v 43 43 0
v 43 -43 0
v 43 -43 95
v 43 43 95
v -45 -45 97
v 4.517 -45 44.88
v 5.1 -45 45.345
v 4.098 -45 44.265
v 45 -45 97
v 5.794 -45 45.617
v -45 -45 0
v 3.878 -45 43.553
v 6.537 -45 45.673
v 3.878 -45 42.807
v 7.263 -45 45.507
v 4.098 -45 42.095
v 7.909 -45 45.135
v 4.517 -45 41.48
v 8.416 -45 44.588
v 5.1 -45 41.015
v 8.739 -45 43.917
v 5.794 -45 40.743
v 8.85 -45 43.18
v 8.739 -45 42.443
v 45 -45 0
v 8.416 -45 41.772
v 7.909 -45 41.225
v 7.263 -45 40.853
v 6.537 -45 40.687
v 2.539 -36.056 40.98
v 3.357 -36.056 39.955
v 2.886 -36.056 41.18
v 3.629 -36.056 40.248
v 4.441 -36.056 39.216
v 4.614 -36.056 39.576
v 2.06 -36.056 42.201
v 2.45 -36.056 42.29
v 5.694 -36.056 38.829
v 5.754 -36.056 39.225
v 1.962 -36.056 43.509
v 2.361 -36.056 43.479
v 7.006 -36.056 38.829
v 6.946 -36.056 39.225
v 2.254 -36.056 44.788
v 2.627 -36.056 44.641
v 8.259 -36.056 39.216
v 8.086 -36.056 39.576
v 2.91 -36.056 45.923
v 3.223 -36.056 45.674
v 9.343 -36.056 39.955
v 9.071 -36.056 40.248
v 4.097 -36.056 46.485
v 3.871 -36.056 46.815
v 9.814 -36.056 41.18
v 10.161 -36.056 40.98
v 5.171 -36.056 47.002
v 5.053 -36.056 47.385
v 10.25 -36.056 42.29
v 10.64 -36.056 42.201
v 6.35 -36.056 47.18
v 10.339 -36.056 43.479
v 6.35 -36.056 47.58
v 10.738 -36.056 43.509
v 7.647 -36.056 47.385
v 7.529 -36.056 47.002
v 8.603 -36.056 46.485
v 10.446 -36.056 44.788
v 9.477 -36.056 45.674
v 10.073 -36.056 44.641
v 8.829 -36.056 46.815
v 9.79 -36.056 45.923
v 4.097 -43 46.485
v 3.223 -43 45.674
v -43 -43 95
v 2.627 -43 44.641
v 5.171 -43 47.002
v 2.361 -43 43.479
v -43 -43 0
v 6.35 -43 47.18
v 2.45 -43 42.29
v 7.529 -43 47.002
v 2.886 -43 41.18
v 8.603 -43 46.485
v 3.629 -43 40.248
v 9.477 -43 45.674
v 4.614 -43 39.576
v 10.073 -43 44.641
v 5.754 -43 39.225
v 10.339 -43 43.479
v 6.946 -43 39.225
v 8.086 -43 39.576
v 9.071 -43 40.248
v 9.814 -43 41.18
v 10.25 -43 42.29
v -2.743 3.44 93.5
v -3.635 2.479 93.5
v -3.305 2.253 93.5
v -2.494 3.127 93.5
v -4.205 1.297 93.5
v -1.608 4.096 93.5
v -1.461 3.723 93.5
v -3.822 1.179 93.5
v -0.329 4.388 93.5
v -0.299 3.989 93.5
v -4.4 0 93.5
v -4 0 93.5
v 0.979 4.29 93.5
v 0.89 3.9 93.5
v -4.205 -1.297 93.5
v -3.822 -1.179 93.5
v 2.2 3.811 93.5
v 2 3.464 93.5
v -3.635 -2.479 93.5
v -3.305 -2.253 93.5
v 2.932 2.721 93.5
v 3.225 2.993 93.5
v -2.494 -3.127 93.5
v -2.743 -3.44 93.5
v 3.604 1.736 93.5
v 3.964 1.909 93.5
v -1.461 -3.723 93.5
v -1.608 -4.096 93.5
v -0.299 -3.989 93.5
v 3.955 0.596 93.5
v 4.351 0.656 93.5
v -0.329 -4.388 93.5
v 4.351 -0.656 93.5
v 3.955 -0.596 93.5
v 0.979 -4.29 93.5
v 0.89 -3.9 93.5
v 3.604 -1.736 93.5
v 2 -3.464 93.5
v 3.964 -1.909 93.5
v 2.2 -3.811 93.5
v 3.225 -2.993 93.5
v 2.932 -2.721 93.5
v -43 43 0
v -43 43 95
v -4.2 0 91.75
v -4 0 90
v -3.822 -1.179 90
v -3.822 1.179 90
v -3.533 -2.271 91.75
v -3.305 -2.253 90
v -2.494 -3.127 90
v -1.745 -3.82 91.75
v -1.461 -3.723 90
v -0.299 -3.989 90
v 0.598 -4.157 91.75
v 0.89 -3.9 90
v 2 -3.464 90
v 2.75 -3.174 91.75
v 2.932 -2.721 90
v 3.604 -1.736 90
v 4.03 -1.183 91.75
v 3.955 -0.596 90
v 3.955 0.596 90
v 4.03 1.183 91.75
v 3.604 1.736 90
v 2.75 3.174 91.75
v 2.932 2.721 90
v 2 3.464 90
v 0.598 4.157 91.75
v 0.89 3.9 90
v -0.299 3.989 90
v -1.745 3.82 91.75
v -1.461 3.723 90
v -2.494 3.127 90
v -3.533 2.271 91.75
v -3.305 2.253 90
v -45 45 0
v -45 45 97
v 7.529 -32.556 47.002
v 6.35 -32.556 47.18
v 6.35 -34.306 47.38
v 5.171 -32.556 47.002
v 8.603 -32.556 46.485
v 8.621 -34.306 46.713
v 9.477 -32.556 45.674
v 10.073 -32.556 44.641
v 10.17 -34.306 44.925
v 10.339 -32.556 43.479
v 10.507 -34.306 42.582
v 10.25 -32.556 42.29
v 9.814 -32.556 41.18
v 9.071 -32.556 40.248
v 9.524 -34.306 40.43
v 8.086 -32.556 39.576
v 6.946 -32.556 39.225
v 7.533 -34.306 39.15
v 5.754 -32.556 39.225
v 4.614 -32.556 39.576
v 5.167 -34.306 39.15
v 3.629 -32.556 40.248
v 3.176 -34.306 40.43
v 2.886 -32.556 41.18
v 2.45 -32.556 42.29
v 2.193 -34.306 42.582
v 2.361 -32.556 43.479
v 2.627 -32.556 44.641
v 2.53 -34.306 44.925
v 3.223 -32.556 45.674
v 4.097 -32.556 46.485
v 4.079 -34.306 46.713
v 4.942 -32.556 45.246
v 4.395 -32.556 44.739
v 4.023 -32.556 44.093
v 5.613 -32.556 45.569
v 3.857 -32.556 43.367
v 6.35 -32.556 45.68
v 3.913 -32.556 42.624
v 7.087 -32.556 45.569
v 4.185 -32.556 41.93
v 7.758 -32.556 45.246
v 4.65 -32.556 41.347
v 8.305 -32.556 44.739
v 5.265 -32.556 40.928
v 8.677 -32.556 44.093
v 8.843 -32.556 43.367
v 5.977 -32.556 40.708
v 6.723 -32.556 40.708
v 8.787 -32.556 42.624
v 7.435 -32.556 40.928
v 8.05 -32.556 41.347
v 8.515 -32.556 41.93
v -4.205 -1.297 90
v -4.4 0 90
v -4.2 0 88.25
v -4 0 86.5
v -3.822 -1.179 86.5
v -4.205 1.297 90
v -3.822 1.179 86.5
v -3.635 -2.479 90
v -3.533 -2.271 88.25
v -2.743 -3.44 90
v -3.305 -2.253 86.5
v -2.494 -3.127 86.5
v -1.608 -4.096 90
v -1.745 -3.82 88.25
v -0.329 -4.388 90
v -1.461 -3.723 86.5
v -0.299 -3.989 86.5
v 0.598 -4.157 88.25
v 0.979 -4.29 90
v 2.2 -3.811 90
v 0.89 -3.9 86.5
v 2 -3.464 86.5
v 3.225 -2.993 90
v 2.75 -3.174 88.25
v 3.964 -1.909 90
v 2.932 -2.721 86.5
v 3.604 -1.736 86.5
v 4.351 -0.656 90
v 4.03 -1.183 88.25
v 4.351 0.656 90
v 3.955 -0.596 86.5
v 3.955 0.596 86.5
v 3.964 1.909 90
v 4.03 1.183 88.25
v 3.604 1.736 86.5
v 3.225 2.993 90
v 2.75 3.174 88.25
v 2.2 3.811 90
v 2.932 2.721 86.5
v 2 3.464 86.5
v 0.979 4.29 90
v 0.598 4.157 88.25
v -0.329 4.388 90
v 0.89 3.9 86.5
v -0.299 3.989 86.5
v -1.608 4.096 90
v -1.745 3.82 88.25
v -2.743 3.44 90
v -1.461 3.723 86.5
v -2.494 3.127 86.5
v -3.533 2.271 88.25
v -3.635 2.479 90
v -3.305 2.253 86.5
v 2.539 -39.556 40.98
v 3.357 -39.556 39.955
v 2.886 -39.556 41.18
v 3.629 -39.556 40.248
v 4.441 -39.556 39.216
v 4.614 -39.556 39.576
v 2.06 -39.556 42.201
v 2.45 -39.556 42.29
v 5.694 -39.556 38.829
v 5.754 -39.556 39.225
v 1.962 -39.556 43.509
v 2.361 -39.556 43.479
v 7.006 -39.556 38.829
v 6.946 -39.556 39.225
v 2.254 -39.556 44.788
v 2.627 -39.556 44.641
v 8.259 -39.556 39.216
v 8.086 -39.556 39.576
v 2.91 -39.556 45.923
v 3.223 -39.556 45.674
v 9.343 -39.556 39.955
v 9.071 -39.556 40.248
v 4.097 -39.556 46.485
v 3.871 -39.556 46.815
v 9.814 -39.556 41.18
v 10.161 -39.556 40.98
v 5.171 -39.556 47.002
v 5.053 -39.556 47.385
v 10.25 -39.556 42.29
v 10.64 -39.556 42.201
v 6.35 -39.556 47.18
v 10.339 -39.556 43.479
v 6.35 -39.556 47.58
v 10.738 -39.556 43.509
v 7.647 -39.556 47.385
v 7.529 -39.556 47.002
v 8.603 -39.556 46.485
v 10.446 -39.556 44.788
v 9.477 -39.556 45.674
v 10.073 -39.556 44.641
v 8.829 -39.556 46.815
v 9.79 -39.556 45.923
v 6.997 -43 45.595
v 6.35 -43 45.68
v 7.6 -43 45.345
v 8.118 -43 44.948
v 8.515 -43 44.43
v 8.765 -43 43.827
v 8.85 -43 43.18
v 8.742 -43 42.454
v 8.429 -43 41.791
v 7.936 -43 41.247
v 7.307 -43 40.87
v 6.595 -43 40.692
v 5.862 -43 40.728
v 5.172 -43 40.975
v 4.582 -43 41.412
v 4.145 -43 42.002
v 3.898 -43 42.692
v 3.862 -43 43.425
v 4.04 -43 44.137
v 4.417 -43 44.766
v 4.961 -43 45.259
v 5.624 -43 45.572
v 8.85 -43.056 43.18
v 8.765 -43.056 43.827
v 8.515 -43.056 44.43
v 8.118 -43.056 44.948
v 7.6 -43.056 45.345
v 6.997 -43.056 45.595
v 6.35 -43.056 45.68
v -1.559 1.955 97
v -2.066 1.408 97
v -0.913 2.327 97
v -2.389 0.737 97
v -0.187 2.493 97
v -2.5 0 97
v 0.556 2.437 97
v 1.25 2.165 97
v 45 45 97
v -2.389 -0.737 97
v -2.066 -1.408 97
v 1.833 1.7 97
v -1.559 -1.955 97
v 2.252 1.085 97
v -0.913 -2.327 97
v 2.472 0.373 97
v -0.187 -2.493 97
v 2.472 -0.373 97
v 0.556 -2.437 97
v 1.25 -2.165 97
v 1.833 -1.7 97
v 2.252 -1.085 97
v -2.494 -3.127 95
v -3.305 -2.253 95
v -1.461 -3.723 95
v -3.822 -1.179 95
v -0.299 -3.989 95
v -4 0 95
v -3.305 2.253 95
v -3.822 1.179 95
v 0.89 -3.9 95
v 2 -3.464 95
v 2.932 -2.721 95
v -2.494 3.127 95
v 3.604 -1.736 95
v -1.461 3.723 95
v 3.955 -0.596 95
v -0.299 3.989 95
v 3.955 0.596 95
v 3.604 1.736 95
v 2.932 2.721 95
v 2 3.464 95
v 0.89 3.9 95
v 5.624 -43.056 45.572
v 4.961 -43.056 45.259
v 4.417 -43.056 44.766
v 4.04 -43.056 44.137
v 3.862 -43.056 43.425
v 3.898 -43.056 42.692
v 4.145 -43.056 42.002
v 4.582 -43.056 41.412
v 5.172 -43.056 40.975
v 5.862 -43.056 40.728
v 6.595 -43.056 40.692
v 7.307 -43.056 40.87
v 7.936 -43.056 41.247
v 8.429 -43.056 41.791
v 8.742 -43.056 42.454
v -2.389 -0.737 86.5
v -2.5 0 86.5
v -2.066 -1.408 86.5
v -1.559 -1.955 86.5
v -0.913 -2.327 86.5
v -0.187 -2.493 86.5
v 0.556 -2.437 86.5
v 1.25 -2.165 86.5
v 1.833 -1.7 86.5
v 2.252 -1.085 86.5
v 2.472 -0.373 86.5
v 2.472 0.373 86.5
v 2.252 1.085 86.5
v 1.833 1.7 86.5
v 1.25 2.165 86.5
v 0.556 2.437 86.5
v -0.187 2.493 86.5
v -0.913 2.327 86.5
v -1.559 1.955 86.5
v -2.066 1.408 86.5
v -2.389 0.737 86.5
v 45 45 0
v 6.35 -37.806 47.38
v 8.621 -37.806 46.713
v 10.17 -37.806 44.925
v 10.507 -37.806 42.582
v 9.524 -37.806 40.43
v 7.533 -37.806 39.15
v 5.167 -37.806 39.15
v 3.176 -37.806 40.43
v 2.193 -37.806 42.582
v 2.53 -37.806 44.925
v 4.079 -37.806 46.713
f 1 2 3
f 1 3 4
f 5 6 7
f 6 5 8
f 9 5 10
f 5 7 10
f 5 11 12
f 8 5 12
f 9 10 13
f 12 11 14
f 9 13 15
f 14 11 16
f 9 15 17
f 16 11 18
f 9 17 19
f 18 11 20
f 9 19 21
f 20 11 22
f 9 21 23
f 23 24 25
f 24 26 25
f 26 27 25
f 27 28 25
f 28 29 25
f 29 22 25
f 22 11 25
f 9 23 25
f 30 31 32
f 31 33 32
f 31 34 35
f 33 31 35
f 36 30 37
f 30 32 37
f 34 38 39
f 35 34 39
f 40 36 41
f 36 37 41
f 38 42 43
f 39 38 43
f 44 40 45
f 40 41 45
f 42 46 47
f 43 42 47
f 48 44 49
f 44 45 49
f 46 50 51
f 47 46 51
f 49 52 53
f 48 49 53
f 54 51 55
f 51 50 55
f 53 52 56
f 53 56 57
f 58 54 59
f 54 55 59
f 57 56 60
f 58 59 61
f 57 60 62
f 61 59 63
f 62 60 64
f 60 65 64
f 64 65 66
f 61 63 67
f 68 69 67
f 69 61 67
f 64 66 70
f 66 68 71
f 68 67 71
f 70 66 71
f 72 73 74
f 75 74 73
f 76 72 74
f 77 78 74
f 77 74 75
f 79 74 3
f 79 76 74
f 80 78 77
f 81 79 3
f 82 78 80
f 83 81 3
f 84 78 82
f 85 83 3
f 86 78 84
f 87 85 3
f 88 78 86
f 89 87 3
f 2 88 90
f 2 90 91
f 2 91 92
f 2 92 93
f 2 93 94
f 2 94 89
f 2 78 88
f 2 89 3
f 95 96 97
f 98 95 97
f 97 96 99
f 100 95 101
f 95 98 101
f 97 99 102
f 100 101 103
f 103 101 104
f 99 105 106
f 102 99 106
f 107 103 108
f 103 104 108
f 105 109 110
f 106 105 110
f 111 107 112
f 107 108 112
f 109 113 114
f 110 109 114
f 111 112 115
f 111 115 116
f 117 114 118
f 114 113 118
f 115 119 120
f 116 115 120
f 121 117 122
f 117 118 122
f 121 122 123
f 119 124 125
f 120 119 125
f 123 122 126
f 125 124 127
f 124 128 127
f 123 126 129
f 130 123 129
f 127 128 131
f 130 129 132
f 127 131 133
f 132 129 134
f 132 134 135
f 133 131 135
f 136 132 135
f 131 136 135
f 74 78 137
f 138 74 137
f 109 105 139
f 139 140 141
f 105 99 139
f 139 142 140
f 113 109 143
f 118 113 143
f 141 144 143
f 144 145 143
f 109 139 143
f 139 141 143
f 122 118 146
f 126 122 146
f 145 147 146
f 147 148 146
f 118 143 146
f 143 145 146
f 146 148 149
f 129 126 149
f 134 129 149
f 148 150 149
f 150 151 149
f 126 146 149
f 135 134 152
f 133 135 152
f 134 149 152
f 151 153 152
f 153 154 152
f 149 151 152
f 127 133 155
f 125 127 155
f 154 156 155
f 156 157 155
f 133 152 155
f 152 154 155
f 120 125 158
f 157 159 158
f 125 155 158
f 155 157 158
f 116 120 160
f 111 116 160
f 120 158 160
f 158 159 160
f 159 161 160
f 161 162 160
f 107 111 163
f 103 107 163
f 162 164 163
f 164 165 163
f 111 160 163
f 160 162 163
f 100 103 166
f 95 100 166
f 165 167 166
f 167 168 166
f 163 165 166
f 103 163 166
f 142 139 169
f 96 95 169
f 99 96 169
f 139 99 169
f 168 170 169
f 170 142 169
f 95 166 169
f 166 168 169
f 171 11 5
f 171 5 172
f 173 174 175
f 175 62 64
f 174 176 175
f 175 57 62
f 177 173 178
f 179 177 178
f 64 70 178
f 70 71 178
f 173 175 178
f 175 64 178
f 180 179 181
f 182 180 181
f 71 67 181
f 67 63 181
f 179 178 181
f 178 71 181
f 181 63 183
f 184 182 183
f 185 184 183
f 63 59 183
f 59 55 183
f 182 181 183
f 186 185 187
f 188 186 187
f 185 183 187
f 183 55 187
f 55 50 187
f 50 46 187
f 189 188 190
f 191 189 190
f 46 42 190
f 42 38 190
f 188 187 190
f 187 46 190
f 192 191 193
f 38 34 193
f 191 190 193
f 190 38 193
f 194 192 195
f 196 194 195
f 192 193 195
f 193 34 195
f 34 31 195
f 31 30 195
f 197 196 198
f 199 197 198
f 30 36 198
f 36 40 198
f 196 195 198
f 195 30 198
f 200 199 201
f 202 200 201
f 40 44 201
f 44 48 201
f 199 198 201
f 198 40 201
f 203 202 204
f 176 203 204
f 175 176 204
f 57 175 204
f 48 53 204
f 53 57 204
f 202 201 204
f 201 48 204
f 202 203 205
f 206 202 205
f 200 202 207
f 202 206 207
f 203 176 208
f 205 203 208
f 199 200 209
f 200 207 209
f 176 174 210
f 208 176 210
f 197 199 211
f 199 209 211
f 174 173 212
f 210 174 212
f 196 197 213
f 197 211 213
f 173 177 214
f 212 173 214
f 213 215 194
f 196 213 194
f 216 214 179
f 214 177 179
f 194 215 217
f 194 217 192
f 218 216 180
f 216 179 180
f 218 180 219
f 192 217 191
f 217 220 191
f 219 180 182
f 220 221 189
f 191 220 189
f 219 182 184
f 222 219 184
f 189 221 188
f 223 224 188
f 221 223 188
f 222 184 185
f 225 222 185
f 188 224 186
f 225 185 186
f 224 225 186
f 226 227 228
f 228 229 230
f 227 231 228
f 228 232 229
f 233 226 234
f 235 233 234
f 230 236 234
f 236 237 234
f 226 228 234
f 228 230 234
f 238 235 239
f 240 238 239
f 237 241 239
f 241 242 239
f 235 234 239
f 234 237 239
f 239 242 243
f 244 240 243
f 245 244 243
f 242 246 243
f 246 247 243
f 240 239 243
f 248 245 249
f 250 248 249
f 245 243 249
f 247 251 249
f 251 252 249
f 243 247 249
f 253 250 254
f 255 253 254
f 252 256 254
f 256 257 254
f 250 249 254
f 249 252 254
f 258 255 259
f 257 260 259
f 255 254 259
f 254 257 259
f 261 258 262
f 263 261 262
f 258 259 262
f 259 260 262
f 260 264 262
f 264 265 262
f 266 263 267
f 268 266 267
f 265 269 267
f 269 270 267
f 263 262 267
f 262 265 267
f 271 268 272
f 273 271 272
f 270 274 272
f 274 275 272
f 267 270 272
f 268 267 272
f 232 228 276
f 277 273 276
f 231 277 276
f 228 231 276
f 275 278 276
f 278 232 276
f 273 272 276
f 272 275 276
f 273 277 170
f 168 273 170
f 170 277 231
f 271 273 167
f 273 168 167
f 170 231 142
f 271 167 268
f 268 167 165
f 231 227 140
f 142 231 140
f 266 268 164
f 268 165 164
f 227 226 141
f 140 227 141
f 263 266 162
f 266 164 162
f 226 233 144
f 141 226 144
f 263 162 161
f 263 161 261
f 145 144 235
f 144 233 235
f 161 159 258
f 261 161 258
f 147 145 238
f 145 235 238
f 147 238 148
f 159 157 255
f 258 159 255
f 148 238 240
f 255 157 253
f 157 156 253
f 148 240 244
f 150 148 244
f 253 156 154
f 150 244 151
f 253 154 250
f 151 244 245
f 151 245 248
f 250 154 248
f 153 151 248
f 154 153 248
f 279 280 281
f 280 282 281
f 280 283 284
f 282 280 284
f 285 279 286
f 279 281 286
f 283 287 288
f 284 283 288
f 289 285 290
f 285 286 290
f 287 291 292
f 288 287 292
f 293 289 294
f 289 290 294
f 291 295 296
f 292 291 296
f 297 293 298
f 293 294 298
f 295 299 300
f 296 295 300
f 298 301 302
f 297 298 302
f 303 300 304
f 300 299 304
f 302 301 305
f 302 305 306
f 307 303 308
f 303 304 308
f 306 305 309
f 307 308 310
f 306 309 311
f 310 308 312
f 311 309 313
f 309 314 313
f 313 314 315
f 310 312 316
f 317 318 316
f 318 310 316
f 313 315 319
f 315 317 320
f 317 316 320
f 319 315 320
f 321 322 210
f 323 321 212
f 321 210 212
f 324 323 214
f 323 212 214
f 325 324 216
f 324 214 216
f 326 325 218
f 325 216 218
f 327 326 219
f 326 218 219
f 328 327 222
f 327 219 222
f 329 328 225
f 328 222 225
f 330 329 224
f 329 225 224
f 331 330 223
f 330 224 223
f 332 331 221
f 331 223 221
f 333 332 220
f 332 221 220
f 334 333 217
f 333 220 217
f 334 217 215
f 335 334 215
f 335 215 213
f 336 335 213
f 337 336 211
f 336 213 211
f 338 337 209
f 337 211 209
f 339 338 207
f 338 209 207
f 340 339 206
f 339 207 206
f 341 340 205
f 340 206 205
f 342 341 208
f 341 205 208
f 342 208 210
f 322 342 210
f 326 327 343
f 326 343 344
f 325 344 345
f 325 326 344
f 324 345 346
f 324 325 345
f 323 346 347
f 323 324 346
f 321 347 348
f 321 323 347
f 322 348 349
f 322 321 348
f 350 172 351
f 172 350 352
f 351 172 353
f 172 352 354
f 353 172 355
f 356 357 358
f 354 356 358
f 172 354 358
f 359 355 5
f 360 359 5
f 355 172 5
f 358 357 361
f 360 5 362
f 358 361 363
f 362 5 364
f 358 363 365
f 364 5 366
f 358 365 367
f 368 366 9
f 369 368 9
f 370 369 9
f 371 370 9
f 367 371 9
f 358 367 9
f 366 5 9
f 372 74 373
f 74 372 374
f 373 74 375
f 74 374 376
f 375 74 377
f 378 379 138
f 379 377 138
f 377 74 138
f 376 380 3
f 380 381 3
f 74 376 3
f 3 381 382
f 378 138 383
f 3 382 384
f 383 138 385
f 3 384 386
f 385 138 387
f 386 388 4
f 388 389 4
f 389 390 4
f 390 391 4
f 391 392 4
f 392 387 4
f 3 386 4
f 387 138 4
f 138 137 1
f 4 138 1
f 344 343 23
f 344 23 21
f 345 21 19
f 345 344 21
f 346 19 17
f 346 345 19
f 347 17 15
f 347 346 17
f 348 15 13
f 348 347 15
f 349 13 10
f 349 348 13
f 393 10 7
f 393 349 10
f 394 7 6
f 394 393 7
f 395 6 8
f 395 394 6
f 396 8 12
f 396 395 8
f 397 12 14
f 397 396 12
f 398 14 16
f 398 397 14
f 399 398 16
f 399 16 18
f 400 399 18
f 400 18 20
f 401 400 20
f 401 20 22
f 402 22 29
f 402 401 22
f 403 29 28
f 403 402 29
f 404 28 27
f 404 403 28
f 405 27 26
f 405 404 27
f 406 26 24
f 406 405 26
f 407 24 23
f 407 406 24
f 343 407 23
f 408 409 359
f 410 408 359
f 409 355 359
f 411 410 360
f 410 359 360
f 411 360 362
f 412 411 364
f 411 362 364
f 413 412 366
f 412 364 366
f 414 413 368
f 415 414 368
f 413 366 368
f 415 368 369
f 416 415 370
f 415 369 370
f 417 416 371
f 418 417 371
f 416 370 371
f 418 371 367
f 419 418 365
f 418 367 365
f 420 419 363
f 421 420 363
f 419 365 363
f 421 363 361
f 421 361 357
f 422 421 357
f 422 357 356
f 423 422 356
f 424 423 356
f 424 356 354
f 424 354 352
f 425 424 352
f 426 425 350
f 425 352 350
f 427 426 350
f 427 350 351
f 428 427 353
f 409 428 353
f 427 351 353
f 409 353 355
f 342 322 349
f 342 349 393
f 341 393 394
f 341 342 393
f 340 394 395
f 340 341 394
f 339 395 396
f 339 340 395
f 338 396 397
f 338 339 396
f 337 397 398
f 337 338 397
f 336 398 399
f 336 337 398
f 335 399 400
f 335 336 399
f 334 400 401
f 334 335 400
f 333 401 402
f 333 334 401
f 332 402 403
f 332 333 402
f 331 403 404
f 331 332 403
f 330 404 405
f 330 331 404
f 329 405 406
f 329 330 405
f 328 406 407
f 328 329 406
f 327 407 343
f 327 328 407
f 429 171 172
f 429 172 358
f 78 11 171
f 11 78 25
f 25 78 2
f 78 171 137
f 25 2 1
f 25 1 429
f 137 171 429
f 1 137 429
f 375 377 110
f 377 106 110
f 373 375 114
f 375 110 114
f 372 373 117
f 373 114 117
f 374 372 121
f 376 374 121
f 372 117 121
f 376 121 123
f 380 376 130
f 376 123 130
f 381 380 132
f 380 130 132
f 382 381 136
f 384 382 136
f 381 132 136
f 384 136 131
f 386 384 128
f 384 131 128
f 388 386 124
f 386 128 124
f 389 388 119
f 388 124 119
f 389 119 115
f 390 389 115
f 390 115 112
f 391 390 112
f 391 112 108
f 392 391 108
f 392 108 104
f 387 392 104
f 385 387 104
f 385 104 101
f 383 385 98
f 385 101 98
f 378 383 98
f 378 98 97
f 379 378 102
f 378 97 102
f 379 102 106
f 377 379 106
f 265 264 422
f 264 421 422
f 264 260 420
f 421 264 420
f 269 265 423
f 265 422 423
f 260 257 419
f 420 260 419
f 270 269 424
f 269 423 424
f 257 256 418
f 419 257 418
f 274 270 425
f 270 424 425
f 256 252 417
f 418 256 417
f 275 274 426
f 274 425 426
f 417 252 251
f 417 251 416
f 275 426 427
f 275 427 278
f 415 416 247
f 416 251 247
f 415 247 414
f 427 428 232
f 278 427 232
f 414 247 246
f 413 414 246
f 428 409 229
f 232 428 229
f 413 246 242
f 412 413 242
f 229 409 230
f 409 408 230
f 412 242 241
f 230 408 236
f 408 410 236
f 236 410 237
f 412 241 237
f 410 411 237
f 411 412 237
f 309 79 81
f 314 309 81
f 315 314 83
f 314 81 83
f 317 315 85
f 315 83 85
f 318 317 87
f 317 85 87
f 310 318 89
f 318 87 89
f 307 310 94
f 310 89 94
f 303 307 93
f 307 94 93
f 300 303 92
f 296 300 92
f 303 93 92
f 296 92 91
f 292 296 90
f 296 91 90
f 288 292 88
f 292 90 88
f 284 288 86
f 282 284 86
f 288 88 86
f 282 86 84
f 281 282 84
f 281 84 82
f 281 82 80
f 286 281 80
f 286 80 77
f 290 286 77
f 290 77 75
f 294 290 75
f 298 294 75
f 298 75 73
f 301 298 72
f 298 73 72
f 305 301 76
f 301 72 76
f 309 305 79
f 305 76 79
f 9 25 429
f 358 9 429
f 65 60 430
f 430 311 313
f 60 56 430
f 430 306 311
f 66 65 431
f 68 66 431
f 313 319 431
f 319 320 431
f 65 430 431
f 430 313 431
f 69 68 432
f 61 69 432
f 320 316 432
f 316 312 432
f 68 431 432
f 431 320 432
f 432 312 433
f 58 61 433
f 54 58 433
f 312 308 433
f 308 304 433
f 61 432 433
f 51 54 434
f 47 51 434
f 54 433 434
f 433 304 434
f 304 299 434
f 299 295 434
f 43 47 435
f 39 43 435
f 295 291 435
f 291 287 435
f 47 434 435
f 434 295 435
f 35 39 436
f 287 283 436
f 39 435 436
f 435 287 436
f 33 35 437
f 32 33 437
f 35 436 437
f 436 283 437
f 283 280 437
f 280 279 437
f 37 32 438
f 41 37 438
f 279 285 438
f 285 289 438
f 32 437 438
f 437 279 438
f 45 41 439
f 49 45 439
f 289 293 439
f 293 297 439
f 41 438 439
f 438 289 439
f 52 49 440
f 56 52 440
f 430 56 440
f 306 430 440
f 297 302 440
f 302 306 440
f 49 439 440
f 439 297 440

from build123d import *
from build123d import SkipClean  # not in build123d's __all__

# Parameters (mm, degrees)
F0_W     = 90
F0_H     = 90
F0_W_2   = 86
F0_H_2   = 86
F1_DEPTH = 97
F2_W     = 86
F2_H     = 86
F2_R     = 4
F3_DEPTH = 2
F7_R     = 2.5
F8_DEPTH = 76.2


with BuildPart() as f1:
    # F0 (on Top) → F1 (new body)
    with BuildSketch(Plane.XY):
        Rectangle(F0_W, F0_H)
        Rectangle(F0_W_2, F0_H_2, mode=Mode.SUBTRACT)
    extrude(amount=F1_DEPTH)

    # F2 (on face) → F3 (join)
    with BuildSketch(Plane.XY.offset(97)):
        Rectangle(F2_W, F2_H)
        Circle(F2_R, mode=Mode.SUBTRACT)
    extrude(amount=-F3_DEPTH)

    # F4 (on Front) → F6 (revolve)
    with BuildSketch(Plane.XZ):
        Polygon((-2.5, 97), (-4, 97), (-4, 95), (-4, 93.5), (-4.4, 93.5), (-4, 90), (-4.4, 90), (-4, 86.5), (-2.5, 86.5), align=None)
    revolve(axis=Axis((0, 0, 51.8437661231), (0, 0, 1)))

    # F7 (on Front) → F8 (cut)
    with BuildSketch(Plane.XZ):
        with Locations((6.35, 43.18)):
            Circle(F7_R)
    extrude(amount=F8_DEPTH, mode=Mode.SUBTRACT)

    # F11 (on offset) → F12 (revolve)
    with BuildSketch(Plane.YZ.offset(6.35)):
        Polygon((-39.5560968816, 47.18), (-43.0560968816, 47.18), (-43.0560968816, 45.68), (-32.5560968816, 45.68), (-32.5560968816, 47.18), (-36.0560968816, 47.18), align=None)
        Polygon((-39.5560968816, 47.58), (-39.5560968816, 47.18), (-36.0560968816, 47.18), align=None)
        Polygon((-36.0560968816, 47.58), (-36.0560968816, 47.18), (-32.5560968816, 47.18), align=None)
    with SkipClean():  # cleaning this boolean's faces spoils the solid; the shape is the same uncleaned
        revolve(axis=Axis((6.35, -16.5081392042, 43.18), (0, 1, 0)))


solid = f1.part
